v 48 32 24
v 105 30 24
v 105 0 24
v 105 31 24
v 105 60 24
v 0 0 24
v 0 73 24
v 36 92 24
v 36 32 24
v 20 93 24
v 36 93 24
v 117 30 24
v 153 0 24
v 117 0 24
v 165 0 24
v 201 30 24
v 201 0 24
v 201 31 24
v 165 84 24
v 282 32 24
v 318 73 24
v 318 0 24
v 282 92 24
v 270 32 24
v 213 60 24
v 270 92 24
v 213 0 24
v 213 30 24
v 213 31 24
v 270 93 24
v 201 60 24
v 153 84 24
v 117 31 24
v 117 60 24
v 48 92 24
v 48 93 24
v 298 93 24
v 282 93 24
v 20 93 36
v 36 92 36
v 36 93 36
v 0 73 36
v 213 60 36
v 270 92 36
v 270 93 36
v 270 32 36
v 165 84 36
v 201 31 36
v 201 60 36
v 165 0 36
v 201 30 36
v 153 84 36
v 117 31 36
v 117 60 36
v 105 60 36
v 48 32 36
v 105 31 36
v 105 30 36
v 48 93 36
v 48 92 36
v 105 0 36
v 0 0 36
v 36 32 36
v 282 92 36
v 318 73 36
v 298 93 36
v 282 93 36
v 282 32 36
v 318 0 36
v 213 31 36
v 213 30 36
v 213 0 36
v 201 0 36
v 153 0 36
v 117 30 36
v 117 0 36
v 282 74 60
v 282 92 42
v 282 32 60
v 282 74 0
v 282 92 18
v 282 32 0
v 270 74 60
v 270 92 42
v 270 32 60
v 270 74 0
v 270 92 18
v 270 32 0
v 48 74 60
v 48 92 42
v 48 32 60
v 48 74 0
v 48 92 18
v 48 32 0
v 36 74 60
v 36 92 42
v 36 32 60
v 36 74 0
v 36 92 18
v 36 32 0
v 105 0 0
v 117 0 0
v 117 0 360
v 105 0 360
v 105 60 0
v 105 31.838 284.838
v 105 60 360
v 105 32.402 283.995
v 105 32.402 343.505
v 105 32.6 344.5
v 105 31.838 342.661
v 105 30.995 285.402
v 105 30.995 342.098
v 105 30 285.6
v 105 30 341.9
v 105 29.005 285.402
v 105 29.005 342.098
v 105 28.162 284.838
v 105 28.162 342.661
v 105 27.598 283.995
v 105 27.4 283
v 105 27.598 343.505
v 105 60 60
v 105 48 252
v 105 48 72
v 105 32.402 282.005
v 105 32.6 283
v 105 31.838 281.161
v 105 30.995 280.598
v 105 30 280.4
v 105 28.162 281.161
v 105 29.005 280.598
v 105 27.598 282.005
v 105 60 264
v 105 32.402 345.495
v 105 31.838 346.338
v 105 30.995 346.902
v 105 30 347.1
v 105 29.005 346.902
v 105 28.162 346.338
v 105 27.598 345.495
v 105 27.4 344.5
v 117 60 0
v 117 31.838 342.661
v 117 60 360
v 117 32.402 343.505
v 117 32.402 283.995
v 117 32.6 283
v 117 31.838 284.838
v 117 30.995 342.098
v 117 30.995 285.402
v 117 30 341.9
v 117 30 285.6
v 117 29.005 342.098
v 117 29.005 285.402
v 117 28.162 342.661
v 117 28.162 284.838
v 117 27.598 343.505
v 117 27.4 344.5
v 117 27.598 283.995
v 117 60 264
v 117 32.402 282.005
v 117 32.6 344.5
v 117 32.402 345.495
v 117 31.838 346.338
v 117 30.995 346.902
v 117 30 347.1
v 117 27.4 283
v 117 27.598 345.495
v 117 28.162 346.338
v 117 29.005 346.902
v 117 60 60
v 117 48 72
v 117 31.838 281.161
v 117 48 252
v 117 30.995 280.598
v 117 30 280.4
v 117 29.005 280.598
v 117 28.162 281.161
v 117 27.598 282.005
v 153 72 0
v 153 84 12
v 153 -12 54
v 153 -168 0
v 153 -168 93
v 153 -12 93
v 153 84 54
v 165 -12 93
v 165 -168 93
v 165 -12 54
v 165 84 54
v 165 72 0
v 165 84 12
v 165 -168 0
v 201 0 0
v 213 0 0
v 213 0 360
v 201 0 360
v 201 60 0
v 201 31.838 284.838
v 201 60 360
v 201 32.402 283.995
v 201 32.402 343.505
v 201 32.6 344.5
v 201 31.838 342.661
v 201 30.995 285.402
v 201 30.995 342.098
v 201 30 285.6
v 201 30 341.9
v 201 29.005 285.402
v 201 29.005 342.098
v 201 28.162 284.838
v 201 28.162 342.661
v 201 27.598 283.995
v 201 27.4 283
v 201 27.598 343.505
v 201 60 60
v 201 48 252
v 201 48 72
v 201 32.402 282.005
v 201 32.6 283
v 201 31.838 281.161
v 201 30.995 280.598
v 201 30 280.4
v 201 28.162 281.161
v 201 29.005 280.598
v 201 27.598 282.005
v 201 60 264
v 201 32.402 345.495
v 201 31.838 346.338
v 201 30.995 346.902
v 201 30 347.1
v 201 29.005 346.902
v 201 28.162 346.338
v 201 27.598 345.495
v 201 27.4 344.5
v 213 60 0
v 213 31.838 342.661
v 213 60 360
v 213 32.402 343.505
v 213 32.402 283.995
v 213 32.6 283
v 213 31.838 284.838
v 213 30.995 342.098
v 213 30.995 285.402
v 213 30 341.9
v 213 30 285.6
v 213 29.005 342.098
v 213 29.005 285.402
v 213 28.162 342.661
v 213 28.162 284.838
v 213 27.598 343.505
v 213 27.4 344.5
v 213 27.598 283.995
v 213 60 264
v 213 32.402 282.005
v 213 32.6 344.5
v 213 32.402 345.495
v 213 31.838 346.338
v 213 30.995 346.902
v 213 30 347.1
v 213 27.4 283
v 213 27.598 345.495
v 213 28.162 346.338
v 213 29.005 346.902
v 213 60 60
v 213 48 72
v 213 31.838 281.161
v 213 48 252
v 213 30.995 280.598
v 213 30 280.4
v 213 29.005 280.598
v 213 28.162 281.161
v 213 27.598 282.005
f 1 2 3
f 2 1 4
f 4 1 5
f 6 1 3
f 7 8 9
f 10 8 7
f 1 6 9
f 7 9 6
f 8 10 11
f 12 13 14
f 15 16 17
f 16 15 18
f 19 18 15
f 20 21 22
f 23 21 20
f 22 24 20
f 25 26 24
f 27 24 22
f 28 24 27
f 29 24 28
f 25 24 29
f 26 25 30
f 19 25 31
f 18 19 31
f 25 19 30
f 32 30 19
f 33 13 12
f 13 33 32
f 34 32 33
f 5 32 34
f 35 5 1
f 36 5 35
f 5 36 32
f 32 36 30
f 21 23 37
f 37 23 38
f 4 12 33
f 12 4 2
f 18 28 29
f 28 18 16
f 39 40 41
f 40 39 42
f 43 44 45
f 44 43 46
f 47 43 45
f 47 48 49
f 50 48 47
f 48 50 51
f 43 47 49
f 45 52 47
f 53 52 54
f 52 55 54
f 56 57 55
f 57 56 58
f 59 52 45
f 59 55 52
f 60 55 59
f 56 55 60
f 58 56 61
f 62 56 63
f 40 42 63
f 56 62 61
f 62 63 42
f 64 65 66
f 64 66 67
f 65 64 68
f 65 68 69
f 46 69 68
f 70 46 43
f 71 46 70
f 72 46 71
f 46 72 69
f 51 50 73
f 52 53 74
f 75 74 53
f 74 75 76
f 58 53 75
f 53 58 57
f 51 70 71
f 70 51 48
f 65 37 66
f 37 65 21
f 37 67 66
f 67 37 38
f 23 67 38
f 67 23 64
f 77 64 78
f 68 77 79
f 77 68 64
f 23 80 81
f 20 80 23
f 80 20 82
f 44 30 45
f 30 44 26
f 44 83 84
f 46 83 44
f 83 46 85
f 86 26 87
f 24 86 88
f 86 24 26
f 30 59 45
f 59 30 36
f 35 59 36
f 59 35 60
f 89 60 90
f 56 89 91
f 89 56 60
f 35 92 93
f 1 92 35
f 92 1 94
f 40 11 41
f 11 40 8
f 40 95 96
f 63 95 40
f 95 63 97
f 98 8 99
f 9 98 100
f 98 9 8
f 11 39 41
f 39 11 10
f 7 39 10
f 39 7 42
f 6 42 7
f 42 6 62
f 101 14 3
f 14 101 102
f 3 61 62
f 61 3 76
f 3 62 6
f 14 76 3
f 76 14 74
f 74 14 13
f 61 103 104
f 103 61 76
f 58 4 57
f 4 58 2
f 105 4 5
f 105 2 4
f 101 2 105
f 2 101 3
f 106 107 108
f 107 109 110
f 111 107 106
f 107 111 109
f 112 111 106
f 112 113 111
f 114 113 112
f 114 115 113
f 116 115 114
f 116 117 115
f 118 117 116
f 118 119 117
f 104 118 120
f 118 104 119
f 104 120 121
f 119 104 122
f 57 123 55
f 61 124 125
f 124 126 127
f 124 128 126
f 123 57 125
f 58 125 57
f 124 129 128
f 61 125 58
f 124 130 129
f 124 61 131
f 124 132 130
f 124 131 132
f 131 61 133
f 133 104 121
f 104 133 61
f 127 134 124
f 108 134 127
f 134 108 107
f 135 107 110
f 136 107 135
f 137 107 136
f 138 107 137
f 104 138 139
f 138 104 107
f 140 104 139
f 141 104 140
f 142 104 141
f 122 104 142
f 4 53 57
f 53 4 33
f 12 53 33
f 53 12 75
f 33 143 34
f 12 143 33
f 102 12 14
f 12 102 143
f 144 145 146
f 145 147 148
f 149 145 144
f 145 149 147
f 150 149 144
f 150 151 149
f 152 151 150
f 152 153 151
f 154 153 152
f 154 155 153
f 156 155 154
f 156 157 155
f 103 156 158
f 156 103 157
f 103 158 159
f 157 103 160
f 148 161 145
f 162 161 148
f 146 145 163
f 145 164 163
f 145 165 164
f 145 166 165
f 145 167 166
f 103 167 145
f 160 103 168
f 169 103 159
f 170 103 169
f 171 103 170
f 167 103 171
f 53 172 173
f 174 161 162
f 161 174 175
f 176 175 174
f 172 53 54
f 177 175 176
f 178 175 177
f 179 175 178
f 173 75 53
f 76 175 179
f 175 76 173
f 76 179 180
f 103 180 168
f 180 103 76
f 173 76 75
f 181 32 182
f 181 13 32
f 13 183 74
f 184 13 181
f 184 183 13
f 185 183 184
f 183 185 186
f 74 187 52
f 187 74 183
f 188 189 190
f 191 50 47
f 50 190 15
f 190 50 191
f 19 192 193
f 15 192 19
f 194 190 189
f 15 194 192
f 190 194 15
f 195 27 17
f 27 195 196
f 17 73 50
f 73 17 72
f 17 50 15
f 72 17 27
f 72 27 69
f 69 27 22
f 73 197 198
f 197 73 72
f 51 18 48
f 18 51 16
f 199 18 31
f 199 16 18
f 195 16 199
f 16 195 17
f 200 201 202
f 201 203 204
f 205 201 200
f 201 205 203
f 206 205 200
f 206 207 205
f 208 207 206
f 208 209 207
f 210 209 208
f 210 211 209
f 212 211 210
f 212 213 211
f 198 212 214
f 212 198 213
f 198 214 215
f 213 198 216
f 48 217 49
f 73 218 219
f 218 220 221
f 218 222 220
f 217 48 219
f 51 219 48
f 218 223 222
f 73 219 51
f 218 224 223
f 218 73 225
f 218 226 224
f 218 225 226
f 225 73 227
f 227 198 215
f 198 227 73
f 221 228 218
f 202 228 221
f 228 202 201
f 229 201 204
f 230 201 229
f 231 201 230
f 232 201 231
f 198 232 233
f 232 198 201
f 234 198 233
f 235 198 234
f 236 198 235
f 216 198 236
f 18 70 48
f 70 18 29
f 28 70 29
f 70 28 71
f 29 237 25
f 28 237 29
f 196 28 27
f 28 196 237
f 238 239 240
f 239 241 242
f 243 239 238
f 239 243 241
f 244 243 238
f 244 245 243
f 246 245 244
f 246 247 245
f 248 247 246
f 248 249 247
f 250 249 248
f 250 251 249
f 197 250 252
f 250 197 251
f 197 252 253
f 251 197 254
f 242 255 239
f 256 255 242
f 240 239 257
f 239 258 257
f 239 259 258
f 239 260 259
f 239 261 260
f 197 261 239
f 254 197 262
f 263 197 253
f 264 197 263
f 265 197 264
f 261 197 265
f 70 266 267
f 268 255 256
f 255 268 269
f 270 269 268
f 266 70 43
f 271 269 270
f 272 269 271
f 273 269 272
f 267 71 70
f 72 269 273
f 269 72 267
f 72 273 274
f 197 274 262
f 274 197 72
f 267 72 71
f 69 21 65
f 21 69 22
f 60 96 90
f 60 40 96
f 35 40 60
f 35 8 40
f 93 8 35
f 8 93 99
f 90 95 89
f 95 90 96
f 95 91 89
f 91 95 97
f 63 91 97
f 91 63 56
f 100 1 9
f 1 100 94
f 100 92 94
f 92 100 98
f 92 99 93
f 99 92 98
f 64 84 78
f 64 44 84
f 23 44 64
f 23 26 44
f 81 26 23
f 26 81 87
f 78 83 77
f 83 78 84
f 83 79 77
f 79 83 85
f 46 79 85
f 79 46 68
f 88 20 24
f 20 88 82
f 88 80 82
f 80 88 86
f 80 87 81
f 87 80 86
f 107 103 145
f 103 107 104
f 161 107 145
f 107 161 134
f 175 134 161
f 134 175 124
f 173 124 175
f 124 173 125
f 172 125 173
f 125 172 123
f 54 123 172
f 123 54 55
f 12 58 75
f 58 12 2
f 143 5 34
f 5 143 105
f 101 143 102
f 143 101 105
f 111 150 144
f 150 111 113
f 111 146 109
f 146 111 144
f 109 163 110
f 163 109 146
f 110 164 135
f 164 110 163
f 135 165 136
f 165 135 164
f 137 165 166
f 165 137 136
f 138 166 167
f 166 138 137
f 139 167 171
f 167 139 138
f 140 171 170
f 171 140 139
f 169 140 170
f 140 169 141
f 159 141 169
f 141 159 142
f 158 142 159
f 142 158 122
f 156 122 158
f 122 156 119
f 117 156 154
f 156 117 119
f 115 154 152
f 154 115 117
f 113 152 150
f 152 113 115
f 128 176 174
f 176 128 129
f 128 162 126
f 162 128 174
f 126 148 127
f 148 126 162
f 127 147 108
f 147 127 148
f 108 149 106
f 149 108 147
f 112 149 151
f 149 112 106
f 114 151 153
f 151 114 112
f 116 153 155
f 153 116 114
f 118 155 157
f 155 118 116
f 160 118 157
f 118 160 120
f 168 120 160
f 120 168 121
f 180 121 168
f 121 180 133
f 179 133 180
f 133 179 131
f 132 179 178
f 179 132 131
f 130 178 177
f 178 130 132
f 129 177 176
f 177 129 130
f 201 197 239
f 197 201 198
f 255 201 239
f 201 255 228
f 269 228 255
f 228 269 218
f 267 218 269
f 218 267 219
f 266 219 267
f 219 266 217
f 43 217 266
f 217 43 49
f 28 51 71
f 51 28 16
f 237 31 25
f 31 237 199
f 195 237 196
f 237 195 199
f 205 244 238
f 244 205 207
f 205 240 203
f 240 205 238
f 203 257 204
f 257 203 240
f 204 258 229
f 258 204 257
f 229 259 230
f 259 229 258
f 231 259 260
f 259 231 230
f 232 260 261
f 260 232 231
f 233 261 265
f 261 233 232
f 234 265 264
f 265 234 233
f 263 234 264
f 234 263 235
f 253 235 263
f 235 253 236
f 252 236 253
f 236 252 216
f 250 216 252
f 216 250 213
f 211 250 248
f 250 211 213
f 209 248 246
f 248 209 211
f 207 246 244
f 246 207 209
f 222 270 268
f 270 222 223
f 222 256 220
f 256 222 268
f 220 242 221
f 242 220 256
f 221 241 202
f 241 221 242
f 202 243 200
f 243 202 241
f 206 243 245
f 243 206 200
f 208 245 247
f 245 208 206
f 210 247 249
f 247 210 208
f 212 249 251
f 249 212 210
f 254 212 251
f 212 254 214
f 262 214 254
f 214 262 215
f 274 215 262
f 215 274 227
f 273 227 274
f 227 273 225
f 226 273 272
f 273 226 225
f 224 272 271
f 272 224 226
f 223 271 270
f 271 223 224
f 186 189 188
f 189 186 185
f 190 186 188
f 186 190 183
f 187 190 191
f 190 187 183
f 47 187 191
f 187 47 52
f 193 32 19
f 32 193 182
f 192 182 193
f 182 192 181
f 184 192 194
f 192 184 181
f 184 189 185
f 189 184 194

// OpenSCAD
// ==========================================================================
//  GENERATED FILE -- DO NOT EDIT.
//  Produced by build/build.py from components/Turtle_Bottom_Ballast_Fin.scad
//  Turtle Body version 7.2.1
//  Edit lib/ and src/ instead, then run: python3 build/build.py
// ==========================================================================
/*
 Hope Turtle — standalone ballast attachment. Units: mm.
 License: CERN-OHL-S-2.0.
 Two green core slats, one orange bottom board, two red lock feet, one
 yellow ballast fin. No bottle. Individual pieces lie flat on Z=0;
 the assembly raises its lowest component to Z=0.

 SOURCE FILE — geometry lives in lib/ballast_fin.scad + lib/params.scad.
 The committed self-contained file is generated by build/build.py.
*/

part = "assembly"; // [assembly,core_slat,bottom_board,lock_foot,fin]
enable_color_coding = true;
ballast_fin_inspection_pullout = 0; // mm; 0 seats the fin

// [bundle] begin use <../../lib/ballast_fin.scad>
// ==========================================================================
//  Turtle Body -- bottom ballast attachment  (lib module)
// --------------------------------------------------------------------------
//  Two green core slats, one orange bottom board, two red lock feet, one
//  yellow ballast fin. No bottle. See CLAUDE.md s12.
//
//  Use clear inner-face spacing (= bottle_diameter), not centre spacing, for
//  bottle clearance. The yellow fin's bottle-seat cut is enlarged by one
//  stock thickness so the bottle clears it -- preserved here. Ballast joints
//  keep nominal stock slot widths (the rear fin's 0.2 mm allowance is NOT
//  added here).
//
//  Definitions only. Geometry is emitted by local_ballast_assembly() or the
//  individual part modules.
// ==========================================================================

// [bundle] begin use <params.scad>
// ==========================================================================
//  Turtle Body -- shared dimension contract
// --------------------------------------------------------------------------
//  The single source of truth for every dimension that more than one
//  subsystem depends on. Values are exposed as zero-argument functions so
//  this file can be pulled in with `use <params.scad>` (which ignores
//  top-level variable assignments) without polluting any namespace.
//
//  lib/ modules take these as DEFAULT argument values:
//      module control_cap(roof_t = p_cap_roof_t(), ...) { ... }
//  so a src/ wrapper can still override one value from its customizer block
//  while every other subsystem keeps the shared number.
//
//  Rules:
//   * one function per concept, canonical name (see CLAUDE.md cross-file table)
//   * derived values are functions of other p_*() functions, never re-typed
//   * mm throughout; names say _d (diameter), _r (radius), _t (thickness),
//     _len / _h (axial), _af (hex across-flats)
//   * do NOT add a bare `x = ...;` here -- bundle.py / lint.py will reject it
// ==========================================================================

// ---- tolerances and render quality --------------------------------------
function p_eps()          = 0.02;   // Boolean overlap / cut-through fudge
function p_fit_clearance() = 0.2;   // wood joint: TOTAL extra slot width, centred on the board
function p_fn_plastic()   = 120;    // printed PLA parts (cap, cage, axle, mold)
function p_fn_wood()      = 96;     // cut wooden parts
function p_fn_curve()     = 180;    // fine profile curves (bottle, sails)

// ---- bottle (the foundation reference) ---------------------------------
function p_bottle_d()        = 84;    // outside diameter (was 86, and 82 before that; other bottle dims held)
function p_bottle_h()        = 305;   // total height incl. ordinary screw cap
function p_bottle_wall_t()   = 0.5;   // modelling assumption, not a measurement
function p_bottle_cap_d()    = 31;    // ordinary screw cap (NOT the control-cap disk)
function p_bottle_cap_h()    = 17;    // ordinary screw cap height (rear-fin / ballast formulas)
function p_collar_d()        = 34;    // bottle collar, independent of cap diameter
function p_top_dome_h()      = 62;
function p_bottom_dome_h()   = 25;
function p_dome_power()      = 2.5;   // superellipse exponent
function p_bottle_neck_h()   = 5;
function p_bottle_collar_h() = 1;
function p_bottle_neck_d()   = p_bottle_cap_d() - 3;   // 28: neck is 3 mm under the cap
function p_bottle_base_ratio() = 0.88; // slightly narrower footprint at the base
function p_bottle_profile_steps() = 16;
// cut bottle (control head): the lower dome is removed and a short socket is
// bored so the control-cap insert slides in. Cut plane sits 5 mm above the
// bottom dome height.
function p_bottle_cut_extra()  = 5;
function p_bottle_cut_height() = p_bottom_dome_h() + p_bottle_cut_extra();   // 30

// nominal bottle interior (still used by the cut-bottle mock-up)
function p_bottle_socket_d() = p_bottle_d() - 2 * p_bottle_wall_t();          // 83 at Ø84

// ---- control container (v7.1.0; CLAUDE.md s7b) ------------------------
// The control unit is a length of transparent PVC pipe (bought-in, nominal,
// not calipered), not a cut bottle. The control cap closes its top end, the
// control plug its bottom end. Independent of the bottle size.
function p_ctrl_pipe_od()  = 85;
function p_ctrl_pipe_id()  = 81;
function p_ctrl_pipe_len() = 254;   // 10 in cut length; the cap and plug disks add to it

// the cap / plug insert that enters the pipe (was the cut bottle's socket
// until v7.1.0 -- 81 at the Ø84 bottle, 79 at Ø82)
function p_insert_shaft_radial_clearance() = 1;
function p_insert_shaft_d()  = p_ctrl_pipe_id()
                             - 2 * p_insert_shaft_radial_clearance();          // 79

// ---- wooden stock -----------------------------------------------------
function p_wood_t()          = 12;    // shared board / slat thickness
function p_fin_board_w()     = 93;    // shared fin-system stock width
function p_screw_side_offset() = 17;  // mounting-hole inset from a John end (was 25 until v4.2.0)

// ---- Ecojoiner port --------------------------------------------------
// A port must swallow the bottle's tapered top (the top dome) plus a seating
// allowance, so its axial length is DERIVED from the bottle, not fixed. This
// is the same rule the HopeTurtles.org generators use
// (port_length = taper_height + port_allowance); until 2026-09-08 lib carried
// the evaluated constant 82 instead, which silently broke the rule for any
// bottle other than the reference one. Ballast and Ecojoiner both read it.
function p_port_allowance()  = 20;                 // seating allowance beyond the dome
function p_port_length()     = p_top_dome_h() + p_port_allowance();   // 62 + 20 = 82
function p_port_height()     = p_bottle_d();       // opening height == bottle diameter (asserted)

// ---- M6 hardware ---------------------------------------------------
function p_m6_clearance_d()  = 6.4;   // M6 clearance hole
function p_m6_bolt_shaft_d() = 6;     // visual placeholder only
function p_m6_bolt_head_d()  = 12;
function p_m6_bolt_head_t()  = 4;

// ---- Ecojoiner bottle clamp: M5 cap screws + acorn nuts (v5.0.0/v5.1.0) --
// Replaces the M6 bolt + 12 mm presser disk. Each John port end carries TWO
// black M5 x 30 socket-head cap screws, stacked across the John height (one
// above, one below the centreline). v5.1.0: no nut -- each screw BITES into
// a 5.2 mm hole in the wood (builder's research; not verified here), so the
// screw itself holds its position and is adjusted with a hex key from
// outside. A black acorn (cap) nut, run fully onto the tip, bears on the
// bottle. Hardware sizes are ISO 4762 / DIN 1587 nominals for visual and
// stack checks only -- measure the hardware you buy.
// Bite-fit hole (was 5.5 clearance in v5.0.0). NOTE it is slightly LARGER
// than the 5 mm nominal major diameter: the hold relies on wood fibre
// springback around the thread, per the builder's own tests -- unverified
// here, and likely to vary with species, moisture and drill quality.
function p_m5_hole_d()           = 5.2;
function p_m5_bolt_d()           = 5;     // visual shank (plain cylinder)
function p_m5_bolt_len()         = 25;    // clamp screw shank under the head (v7.0.0: was 30 -- one
                                          // centred screw reaches 12 mm, not the pair's 16.05)
function p_m5_head_d()           = 8.5;   // ISO 4762 socket head
function p_m5_head_h()           = 5;
function p_m5_acorn_af()         = 8;
function p_m5_acorn_h()          = 10;    // overall, hex base to dome tip
function p_m5_acorn_thread_depth() = 7;   // usable thread before the bolt bottoms
// v7.0.0: ONE clamp screw per John port end, centred across the John height
// (was a pair at +-18 mm). The collar lock below now stops pull-out, so the
// clamp only has to snug the bottle. Every board bolted through a John
// (rear-fin shafts, ballast core slats, head-fin slats) follows: one centred
// clamp hole + one centred lock hole.
//
// LEGACY pair layout -- used ONLY by the experimental lib/pressor.scad until
// the pressor is moved to the single centred screw (deferred, user decision
// 2026-11-22). Nothing else may use it.
function p_eco_screw_edge_inset()  = 12;   // was 10 until v5.2.0
function p_eco_screw_pair_offset() =
    (p_port_height() - 2 * p_wood_t()) / 2 - p_eco_screw_edge_inset();   // 18

// ---- Ecojoiner collar lock (v7.0.0) ----------------------------------------
//  A second M5, centred across each Little/Master John, bites through the
//  John at the bottle's NECK (between the top dome and the Ø34 support ring).
//  Its bare shank stands in front of the ring on both sides of the bottle, so
//  the ring cannot pass back out: a positive stop, not friction. No acorn --
//  an 8 mm acorn cannot enter the 5 mm neck gap, and the bare shank is the pin.
//  Datum: the support ring rests on the outer face of the CROSSING Little John
//  (the next rectangle's board whose Ø34 hole the neck enters). That face is
//  exactly p_port_length() in from this John's outer end (L/2 - rect_y/2 - t/2
//  = PL; asserted in lib/ecojoiner.scad), so the ring's underside is
//  p_port_length() - p_bottle_collar_h() in and the lock axis is centred on
//  the neck below it. NOTE src/Full_Turtle.scad still seats its bottle mock-ups
//  one p_port_height() deep -- equal to p_port_length() only at an 82 mm
//  bottle (2 mm deeper at the 84 default). NOMINAL: p_bottle_neck_h() (5) equals
//  the M5 diameter, so there is no axial margin -- measure a real bottle's gap
//  between ring underside and where the shoulder exceeds the ring diameter.
function p_eco_lock_x() = p_port_length() - p_bottle_collar_h()
                        - p_bottle_neck_h() / 2;                          // 78.5 from the John's outer end
function p_eco_lock_from_clamp() = p_eco_lock_x() - p_screw_side_offset(); // 61.5 inboard of the clamp screw
function p_eco_lock_bolt_len()   = 55;   // M5 x 55: John 12 + reach to the neck, head ~4.5 mm off the face
function p_eco_lock_tip_gap()    = 0.5;  // tip stops this short of the neck -- a pin, not a clamp on the PET

// ---- pressor (EXPERIMENTAL, v6.6.1; lib/pressor.scad, CLAUDE.md s13a) ----
//  A board block in the port gap between a Little John and the bottle,
//  concave-cut to the bottle radius. The John's M5 pair passes into two
//  plain clearance holes in its back edge and pushes it onto the bottle as
//  the screws are turned in -- replaces the acorn nut. Two per port, one
//  each side of the bottle.
function p_pressor_t()          = 15;    // v6.7.4: pressor board thickness (along the bottle axis);
                                          // its own stock, the Johns stay on p_wood_t() 12
function p_pressor_wrap()       = p_bottle_d() / 4;  // 21: inner edge reaches this far past the
                                                      // bottle's tangent line, toward its axis
function p_pressor_travel()     = 1;     // screw-in travel: gap left at the John face when pressed
function p_pressor_hole_d()     = 6;     // v6.7.4: plain Ø6 clearance hole for the John's M5 screw
                                          // (was a 5.3 x 25.3 pill slot; the Johns keep p_m5_hole_d() 5.2)
function p_pressor_hole_depth() = 8;     // hole depth into the pressor's back edge (v6.6.4: was 10)
function p_pressor_min_wall()   = 3;     // least wood around / beyond a screw hole (asserted)
function p_pressor_end_trim()   = 1.5;   // v6.6.4: taken off EACH end (top/bottom edge) -- the printed
                                          // prototype was 3 mm too long to enter the port

// ---- control cap (large stationary disk; see CLAUDE.md s7) ----------
//  TB-03 resolution: repository 5 mm roof / 2 mm boss is authoritative;
//  the axle (below) is derived to this datum.
function p_cap_disk_d()      = 102;   // control-cap disk (independent of p_bottle_cap_d; was 100, +2 mm)
function p_cap_roof_t()      = 5;     // disk / roof thickness
function p_cap_boss_depth()  = 0;     // extra projection of the centre boss into the hollow cap.
                                       // 0 = no boss, flat cavity ceiling (v6.5.1; was 1.5, before that 2)
function p_cap_boss_d()      = 18;
function p_cap_insert_len()  = 35;    // straight insert shaft length
function p_cap_insert_wall_t() = 4;
function p_cap_entry_chamfer_h()     = 1;
function p_cap_entry_chamfer_delta() = 1;
function p_cap_axle_bore_d() = 6;     // loose: 0.5 mm radial clearance to the Ø5 steel shaft (was 8.7 for Ø8 PLA)
function p_cap_cage_radial_clearance() = 1;   // cap disk -> cage inner wall (radial)
function p_cap_total_h()     = p_cap_roof_t() + p_cap_insert_len();           // 40
function p_cap_bearing_len() = p_cap_roof_t() + p_cap_boss_depth();           // 5 (was 6.5, 7)

// master control cap -- the side tabs ("legs"), buttons, USB-C hole and
// band groove of the production cap (src/components/Bottle_Control_Cap.scad),
// lifted here in v7.1.0 so the cap, the control container's circuit boards
// and the full turtle read one definition. See control_cap_master().
function p_cap_tab_width()        = 22;   // tangential; the circuit boards sandwich it
function p_cap_tab_wall_inset()   = 6;
function p_cap_tab_overhang()     = 28;   // past the insert lip
function p_cap_tab_fillet()       = 4;
function p_cap_tab_taper_gain()   = 6;
function p_cap_tab_taper_start()  = 10;
function p_cap_tab_side_offset()  = 6;    // both legs slid sideways (boards need ~0 -- see s7b)
function p_cap_tab_wire_hole_d()  = 5;
function p_cap_tab_wire_exit()    = 15;
function p_cap_button_d()         = 16.5;
function p_cap_button_center_r()  = 23.2; // true cap centre -> button centre
function p_cap_button_offset()    = 6;    // both buttons slid off the axis line
function p_cap_usbc_d()           = 11;
function p_cap_band_count()       = 1;
function p_cap_band_z()           = 5;    // groove centre from the insert shoulder
function p_cap_band_w()           = 10;
function p_cap_band_depth()       = 2;

// buttons (through both cap and cage)
function p_button_upper_d()  = 17;    // clearance hole in the cap
function p_button_axis()     = "y";   // "x" or "y"
function p_button_radius()   = 25;    // radial position of the two button centres (50 mm apart;
                                       // was 24 / 48 mm -- shared with the cage's matching bore)

// ---- silicone seal grooves + rings (CLAUDE.md s8) ------------------
function p_seal_groove_count()      = 2;
function p_seal_groove_axial_h()    = 2.7; // groove height (was 3.5; retuned to just clear
                                            // the 2.6 mm ring axial thickness below, 0.1 mm margin)
function p_seal_groove_radial_depth() = 2; // groove depth
function p_seal_groove1_from_shoulder() = 12;  // groove centre, measured from the insert SHOULDER
function p_seal_groove2_from_shoulder() = 25;
function p_seal_ring_axial_t()      = 2.6;  // cast ring thickness (was 3)
function p_seal_ring_radial_w()     = 10;   // cast ring radial width (was 5; doubled). NOT validated.
function p_seal_ring_elasticity_reduction() = 0.25;
    // Cast the ring's inner diameter this fraction SMALLER than the groove
    // root it mates to, so real (stretchy) silicone is under tension --
    // and therefore actually grips -- once stretched onto the cap, instead
    // of sitting at a 1:1 as-cast fit. Tweak this here as real silicone
    // behaviour is characterized; NOT validated (see lib/silicone_ring_mold.scad).
function p_seal_groove_root_d() = p_insert_shaft_d()
                                - 2 * p_seal_groove_radial_depth();            // 79 at the 86 mm bottle

// ---- sail shaft: uniform round centre axle (CLAUDE.md s9) ----------
//  Derived to the 5/2 cap datum (TB-03/TB-04). round_inside_cap is measured
//  from the roof underside and INCLUDES the boss -- do not add the boss again.
//  TB-08: the shaft is now one uniform round bar top to bottom -- no hex
//  section. It free-spins in the cap bore (p_cap_axle_bore_d) and passes
//  with a light running clearance through the cage hub bore and the top
//  sail bar's own hole (both p_axle_shaft_hole_d()); it locks to the
//  ROTATING cage with a single M3 set screw through the cage hub
//  (p_cage_setscrew_pilot_d()) rather than a shaped (hex) interference fit.
function p_axle_round_d()        = 5;    // Ø5 steel rod (v6.4.0; was an Ø8 printed PLA shaft)
function p_axle_round_ext()      = 1;    // projection above the cap's outer face
function p_axle_round_inside_cap() = p_cap_insert_len() - 5;  // 30: roof underside to round end (incl. boss)
function p_axle_round_len()      = p_axle_round_inside_cap() + p_cap_roof_t() + p_axle_round_ext();  // 36
function p_axle_upper_len()      = 23;   // continues up through the cage hub + sail bar (was the hex length)
function p_axle_total_len()      = p_axle_upper_len() + p_axle_round_len();
function p_axle_shaft_clearance() = 0.4; // snug fit, diametral (was 0.2 on the Ø8 shaft): any hole the shaft passes
                                          // (but does not bear in) is p_axle_round_d() + this
function p_axle_shaft_hole_d()   = p_axle_round_d() + p_axle_shaft_clearance();  // 5.4 (cage hub bore)
function p_magnet_d()            = 3;    // AS5600 sensing magnet recess
function p_magnet_t()            = 1;

// ---- axle rotary shaft O-ring (waterproofs the axle bore; cast in the mold) ----
//  A round-section O-ring seated in a gland in the control-cap bore, sealing
//  against the spinning round section of the axle. ID is tied to the shaft.
function p_axle_oring_cs()     = 2.0;                                   // cross-section
function p_axle_oring_id()     = p_axle_round_d();                      // 5 -- hugs the shaft
function p_axle_oring_od()     = p_axle_oring_id() + 2 * p_axle_oring_cs();          // 9
function p_axle_oring_mean_r() = (p_axle_oring_id() + p_axle_oring_cs()) / 2;        // 3.5
//  gland cut into the cap bore for it
function p_cap_oring_squeeze()      = 0.25;  // radial squeeze on the seal
function p_cap_oring_gland_od()     = p_axle_oring_od() - 2 * p_cap_oring_squeeze(); // 8.5
function p_cap_oring_gland_w()      = 1.3 * p_axle_oring_cs();                       // 2.6 axial
function p_cap_oring_gland_from_face() = p_cap_bearing_len() / 2; // gland centre, from the cap outer face, along the bore
                                         // (2.5 = mid-roof since the boss went in v6.5.1; was 3.5)

// ---- rotating control cage (CLAUDE.md s6) ------------------------
function p_cage_wall_t()     = 6.5;   // radial wall thickness
function p_cage_roof_t()     = 4;     // roof / surface plate thickness
function p_cage_inner_d()    = p_cap_disk_d() + 2 * p_cap_cage_radial_clearance();   // 102
function p_cage_outer_d()    = p_cage_inner_d() + 2 * p_cage_wall_t();               // 115
function p_cage_skirt_depth()   = 44;   // roof underside to the ORIGINAL skirt rim
function p_cage_peak_extension() = 20;  // crest extends this far past the original rim
function p_cage_valley_wall_h()  = 10;  // minimum wall depth between mounts
function p_cage_total_h()    = p_cage_skirt_depth() + p_cage_roof_t();              // 48 (native)
function p_cage_notch_count()   = 4;
function p_cage_notch_w()    = 22.5;  // batten groove width
function p_cage_notch_depth() = 3.7;
function p_cage_wave_segments() = 240;
function p_cage_hub_d()      = 29;
function p_cage_pocket_d()   = 26;    // top clip pocket (control_cage top_pocket, OFF by default)
function p_cage_pocket_depth() = 4;   //   "        "     "
// TB-08: hex bore replaced by a plain round bore (p_axle_shaft_hole_d(),
// shared with the sail bar) + a radial M3 set screw that locks the cage to
// the shaft -- see p_cage_setscrew_*() below.
function p_cage_bearing_d()  = 9;     // hemispherical bearing bump
function p_cage_bearing_count() = 8;
function p_cage_bearing_pcd() = p_cap_disk_d() - p_cage_bearing_d() + 0.5;          // 91.5
function p_cage_top_hole_d() = 18;    // button / access hole through the roof (v6.5.2: back to 18 from 22;
                                       // the 22 opened onto the hub for set-screw access, off since v6.0.0)
function p_cage_mount_hole_d() = 3.2; // two M3 clearance holes per batten / groove
function p_cage_mount_pitch()  = 32;  // vertical pitch of the pair
function p_cage_lower_hole_from_tip() = 10;
// Single radial M3 set (grub) screw through the hub wall, pressing on the
// shaft to lock cage <-> shaft rotation (TB-08). Self-tapping into the
// printed PLA hub -- not a clearance hole for a separate nut, unlike the
// batten/mount M3 holes above. Pilot diameter is an untested starting
// point (typical M3-into-rigid-plastic self-tap pilots run 2.5-2.8 mm) --
// verify real thread engagement and tapping torque before relying on it.
function p_cage_setscrew_pilot_d() = 2.5;
// v6.0.0: the hub set screw (and its access recess) is switched OFF -- the
// M3 in the sail crossbar connector now clamps the shaft. Kept, not deleted,
// so it can be turned back on.
function p_cage_setscrew_enabled() = false;
// Flat-floored access recess around the set screw, cut into the hub face the
// roof button opening uncovers, running the hub's full height (roof top down
// through the hub bottom). Width is tangential, depth is radial (inward from
// the opening's inner edge).
function p_cage_setscrew_recess_w()     = 5;
function p_cage_setscrew_recess_depth() = 3;
// Set-screw angle is no longer a separate parameter: control_cage() aims it
// at the centre of the roof button opening (button_angle) so a hex key can
// reach it through that opening.
// 45-deg outward chamfer on the roof-top outer edge (0 = sharp). The cage
// prints roof-face-down, so this bevel flares OUT from the bed and stays
// printable; it runs the full perimeter, batten grooves included. See
// lib/control_cage.scad.
function p_cage_roof_bevel() = 3;

// ---- sail apparatus (CLAUDE.md s10) ---------------------------
// SAIL battens. v6.0.0: the upper notch holds two stacked layers (connector
// below, crossbar half above), so the batten grew by the extra layer: 205 +
// 2t (229) at first, trimmed back by t to 205 + t (217) in v6.1.0 so 15 mm of
// batten stands above the notch again. Batten bottom, cage M3 holes and the
// lower rails do not move. The NON-sail battens are shorter: their top is
// flush with the cage roof top (derived in lib/sail_frame.scad, 178 mm).
function p_side_batten_h()   = 205 + p_wood_t();       // 217
function p_side_batten_w()   = 20;
// v6.5.0: battens are cut from the same board as every other slat (were a
// separate 20 x 10 stock), so their radial thickness -- and every slot that
// takes a batten -- is the board thickness.
function p_side_batten_radial_t() = p_wood_t();     // 12 (was 10)
// Top crossbar span, tip to tip: 6 x bottle_d (504). v6.1.0 briefly made each
// half a head-fin-slat length (span 843.6); v6.2.0 reverted it -- the sails
// came out too big. The halves are derived from this span.
function p_top_crossbar_len() = 6 * p_bottle_d();   // 504 (halves 212.2 each)
function p_top_crossbar_w()  = 22;
function p_top_crossbar_t()  = p_wood_t();          // 12
// v6.0.0: the top crossbar is split into a LEFT and RIGHT half plus a
// centre "sail crossbar connector". The connector lies on the cage roof and
// spans between the two sail battens; each half lies on top of it and runs
// out to its tip. Both layers half-lap into the same (now 2t tall) sail-batten
// notch, and one M3 per side screws the half down into the connector.
// The shaft passes the connector with generous clearance (no bearing), and an
// M3 self-tapped in from the connector's side face clamps it, locking frame,
// cage and shaft together (replaces the cage hub set screw).
function p_sail_connector_axle_hole_d()  = 6;     // Ø5 steel shaft, 0.5 mm radial clearance (v6.4.0; was 9 for the Ø8 shaft)
function p_sail_m3_pilot_d()             = 2.8;   // self-tap pilot: clamp screw + the half-to-connector screws
function p_sail_m3_clear_d()             = p_cage_mount_hole_d();   // 3.2, through the top (half) layer
function p_sail_connector_overhang()     = 15;    // connector past each sail batten's outer face
function p_sail_bar_half_inboard()       = 15;    // each half runs this far inboard of its batten
function p_bottom_rail_len() = 3 * p_bottle_d() + p_wood_t();   // 264 (v6.3.0: +t; 252 in v6.2.0, 360 in v6.1.0)
function p_bottom_rail_bottle_clearance() = 1;
function p_sail_rail_color()  = [0.56, 0.39, 0.39]; // brown (top AND bottom rails)
function p_c_piece_color()    = [1.0, 0.52, 0.20];  // orange, retained

// ---- rear fin + solar support (CLAUDE.md s11) ----------------
function p_solar_panel_w() = 148;
function p_solar_panel_h() = 223;
function p_solar_panel_t() = 2.5;    // real panel, independent of wood thickness
// The green shafts overlap the yellow fin over X = 0..p_rear_shaft_rear_x()
// (the half-lap zone, 84 mm). v5.3.0: the bottle base must ABUT the fin's
// front edge (X = 0) so the fin holds the bottle in its port -- previously
// the full turtle seated the bottle base at the shafts' rear end, putting the
// first 84 mm of the fin inside the bottle. The shaft front (and its John
// hole pair) stays where it was, so the shafts grow by exactly that overlap:
//   334 (old approved formula) + 84 = 418.
// v5.7.0: the yellow fin is exactly one board wide (it was board + a 15 mm
// "rear tab", 108 mm -- wider than the 93 mm board it is cut from), so the
// overlap is board width - 2t: 84 -> 69, shaft 418 -> 403, half-lap 42 -> 34.5.
function p_rear_shaft_rear_x() = p_fin_board_w() - 2 * p_wood_t();             // 69
function p_rear_shaft_len() = p_bottle_h()
                            + (2/3) * (p_fin_board_w() - 2 * p_wood_t())
                            - p_bottle_cap_h()
                            + p_rear_shaft_rear_x();                            // 403 (418 v5.3.0-v5.6.0)
function p_rear_half_lap_engagement() = p_rear_shaft_rear_x() / 2;  // 34.5 green/yellow interlock depth
// v5.4.0: the green shaft is as wide as the Ecojoiner John it bolts flush
// against (John height = port height - 2 x stock), so their edges and M5 pair
// line up. Was a fixed 59 -- 1 mm narrower than the 60 mm John, and the M5
// pair (centred on it) sat 11.5 mm in from its edges instead of 12.
function p_rear_shaft_width()   = p_port_height() - 2 * p_wood_t();            // 60
// TB-07: the green-slat mounting hole follows the mating Ecojoiner John, not a
// fixed 50 mm. Derived from the install transform; the john_length/2 terms
// cancel, leaving a pure function of the shared contract (= 113 at defaults).
// v5.3.0: the install now seats the bottle base at fin X = 0 (not at the
// shaft rear, X = p_rear_shaft_rear_x()), so that overlap is subtracted back
// out -- the hole stays 113 mm from the (unmoved) shaft front.
function p_rear_shaft_hole_from_front() =
    p_rear_shaft_len() - p_rear_shaft_rear_x() - p_screw_side_offset()
    - p_bottle_h() + p_bottle_cap_h() + p_port_height();

// ---- head fin: front fin (v5.8.0, EXPERIMENTAL; triangle since v6.3.0) ---------
// The rear fin's mirror on the front (-X / physical 9 o'clock) port: two
// flat slats above and below the front bottle bolt to the same Little John
// M5 pairs and run the length of the bottle; a vertical triangular fin
// half-laps into their outer ends and abuts the bottle base. Not built or
// tested. See lib/head_fin.scad.
//  * fin width (forward, along the bottle axis) = the widest board, so the
//    fin is cut across one board (its height runs along the board's length)
//  * the slats reach exactly as far into the Ecojoiner as the rear shafts,
//    so their M5 pair lands at the same distance from the slat front
function p_head_fin_w()       = p_fin_board_w();                         // 93
function p_head_fin_h()       = p_bottle_d() + 6 * p_wood_t();           // 156: 2t of fin beyond each slat
function p_head_slat_overlap() = 4 * p_wood_t();                         // 48: slat run into the fin
// v6.3.1 profile (v6.3.0 had the slope the other way): the TOP edge runs
// out only to this X (where the slats end); the leading edge slopes down and
// FORWARD from there to a vertical flat "toe" at the full fin width, which
// meets the bottom edge. Full width along the BOTTOM edge.
function p_head_fin_heel_x()  = p_head_slat_overlap();                   // 48: top-edge length
function p_head_fin_toe_h()   = 3 * p_wood_t();                          // 36: vertical flat nose at the bottom front (v6.3.4; was 2t)
// v6.3.2: the fin extends DOWN below p_head_fin_h()'s bottom by this much (top
// unchanged), and its new bottom-front corner is set back, giving a raked
// forefoot below the toe flat.
function p_head_fin_drop()    = 3 * p_wood_t();                          // 36
function p_head_fin_forefoot_setback() = p_head_fin_drop();             // 36: = drop -> 45 deg cut (v6.3.3; was 18)
function p_head_half_lap_engagement() = p_head_slat_overlap() / 2;       // 24
function p_head_slat_reach()  = p_rear_shaft_len() - p_rear_shaft_rear_x();   // 334: bottle base -> slat front
function p_head_slat_len()    = p_head_slat_reach() + p_head_slat_overlap();  // 382
function p_head_slat_width()  = p_rear_shaft_width();                    // 60 == John height
function p_head_slat_hole_from_front() = p_rear_shaft_hole_from_front(); // 113: same reach -> same John pair

// ---- ballast attachment (CLAUDE.md s12) ---------------------
function p_ballast_core_w()   = p_port_height() - 2 * p_wood_t();               // 60 == John height
function p_ballast_core_len() = p_bottle_h() - p_bottle_cap_h() + 6 * p_wood_t();  // 360
function p_ballast_slat_gap() = p_port_height();       // clear inner-face gap
function p_ballast_slat_spacing() = p_port_height() + p_wood_t();               // 96
function p_ballast_board_len() = 3.5 * p_bottle_d() + 2 * p_wood_t();   // 318 (v5.5.0: +2t, 3t ends past the foot slots)
function p_ballast_fin_len()   = 3 * p_bottle_d();     // 246
function p_ballast_lock_w()    = 5 * p_wood_t();       // 60

// ---- neutral wood shades (used when enable_color_coding = false) -------
// With the full colour code off, every wooden subsystem still renders in its
// OWN shade of brown so the parts stay visually separable. All are warm browns
// (R > G > B) spaced by lightness. The two large fins share one darker shade so
// they read as a matched pair, distinct from the rest of their own assembly.
function p_wood_shade_sail()     = [0.85, 0.66, 0.47]; // sail frame  (lightest)
function p_wood_shade_rear_fin() = [0.72, 0.50, 0.33]; // rear-fin shafts + solar holder
function p_wood_shade_eco()      = [0.62, 0.44, 0.28]; // Ecojoiner core
function p_wood_shade_ballast()  = [0.52, 0.34, 0.22]; // ballast slats / board / locks
function p_wood_shade_fin()      = [0.40, 0.26, 0.17]; // rear fin + ballast fin, shared (darkest)
// [bundle] end   <params.scad>
// [bundle] begin use <util.scad>
// ==========================================================================
//  Turtle Body -- shared helper modules and functions
// --------------------------------------------------------------------------
//  Small pieces that were copy-pasted across the standalone files. Geometry
//  lives in the per-subsystem lib/ modules; this file is only glue.
//
//  Definitions only -- no top-level geometry, no top-level assignments.
// ==========================================================================

// [bundle] begin use <params.scad>
// [bundle] already inlined: params.scad
// [bundle] end   <params.scad>

// Colour wrapper for wooden parts. When colour coding is off, every wooden
// component renders in one neutral wood tone; bottles, hardware, sails and
// printed parts keep their own colours and never call this.
module wood_color(coded_color, enabled = true, neutral = [0.94, 0.83, 0.62]) {
    color(enabled ? coded_color : neutral) children();
}

// scalar clamp
function clamp(v, lo, hi) = v < lo ? lo : (v > hi ? hi : v);

// Visual-only M6 bolt: plain shaft + hex-less cylindrical head. No thread,
// no torque rating -- a placeholder for fit inspection.
//  Local Z=0 is the underside of the head; the shaft runs toward +Z from Z=0
//  (plus an optional tip_extension), the head sits at Z=-head_t..0. Matches
//  the standalone files.
module m6_bolt_placeholder(grip_length, tip_extension = 1,
                           shaft_d = undef, head_d = undef, head_t = undef,
                           color_rgb = [0.15, 0.15, 0.15], fn = 48) {
    sd = shaft_d == undef ? p_m6_bolt_shaft_d() : shaft_d;
    hd = head_d  == undef ? p_m6_bolt_head_d()  : head_d;
    ht = head_t  == undef ? p_m6_bolt_head_t()  : head_t;
    assert(grip_length > 0, "m6_bolt_placeholder: grip_length must be positive.");
    color(color_rgb)
        union() {
            cylinder(d = sd, h = grip_length + tip_extension, $fn = fn);
            translate([0, 0, -ht])
                cylinder(d = hd, h = ht, $fn = fn);
        }
}

// Regular hexagonal prism specified by across-flats width (OpenSCAD's
// cylinder($fn=6) is specified across corners, which is the usual trap).
module hex_prism_af(across_flats, h, center = false) {
    cylinder(d = across_flats / cos(30), h = h, $fn = 6, center = center);
}
// [bundle] end   <util.scad>

function bl_t()            = p_wood_t();
// The green core slats bolt flush against the Ecojoiner's Little Johns and
// clamp the bottle between them, so they follow the PORT height (== bottle
// diameter here; the HopeTurtles.org generator adds the form's fit offset):
// width == John height, inner-face gap == port height. v5.4.1: written in
// p_port_height() terms (same values) to make that tie explicit.
function bl_core_w()       = p_port_height() - 2 * bl_t();                       // 60 == John height
function bl_core_h()       = p_bottle_h() - p_bottle_cap_h() + 6.0 * bl_t();     // 360
function bl_lower_lobe()   = 2 * bl_t();
function bl_upper_lobe()   = 2 * bl_t();
function bl_core_slot_h()  = bl_t();
function bl_core_slot_depth() = bl_core_w() / 2;
function bl_neck_w()       = p_port_height() - 3 * bl_t();                       // 48
function bl_shoulder_step()   = bl_core_w() - bl_neck_w();                       // 12
// Distance from the slat top down to where the upper 45-degree shoulder cut
// begins. The seated slat top is port_length + t inside the outer John's
// port end, so the cut must start at least that far down or it bites into
// the slat while still inside the John. v5.6.0: was one port_height (84,
// 10 mm inside the John); now one board width lower and never above the
// John end -- max(port_height, port_length) + t (96 at defaults).
function bl_upper_diag_from_top() = max(p_port_height(), p_port_length()) + bl_t();
function bl_upper_diag_start() = bl_core_h() - bl_upper_diag_from_top();
function bl_upper_neck_start() = bl_upper_diag_start() - bl_shoulder_step();
function bl_core_slot_z0() = bl_lower_lobe();
function bl_core_slot_z1() = bl_core_slot_z0() + bl_core_slot_h();
function bl_lower_full_return() = bl_core_slot_z1() + bl_upper_lobe();
function bl_lower_neck_start()  = bl_lower_full_return() + bl_shoulder_step();
function bl_mount_hole_from_top() = p_port_length() + bl_t() - p_screw_side_offset();  // 77
function bl_mount_hole_x()  = bl_core_w() / 2;
function bl_mount_hole_y()  = bl_core_h() - bl_mount_hole_from_top();
// v7.0.0 collar-lock hole: centred, p_eco_lock_from_clamp() nearer the slat
// top (= the core) than the clamp hole -- 15.5 mm from the top at defaults.
function bl_lock_hole_from_top() = bl_mount_hole_from_top() - p_eco_lock_from_clamp();
function bl_lock_hole_y()   = bl_core_h() - bl_lock_hole_from_top();

function bl_board_len()    = p_ballast_board_len();                              // 318
function bl_board_w()      = p_fin_board_w();                                    // 93
function bl_board_slot_w() = bl_t();
function bl_board_slot_depth()  = p_fin_board_w() / 3;
function bl_center_slot_depth() = p_bottle_d() / 2;
function bl_center_slot()  = bl_board_len() / 2;
function bl_slat_spacing() = p_port_height() + bl_t();                          // 96
function bl_left_slot()    = bl_center_slot() - bl_slat_spacing() / 2;
function bl_right_slot()   = bl_center_slot() + bl_slat_spacing() / 2;
// Solid wood outboard of each red-foot slot. v5.5.0: 2 -> 3 board thicknesses
// (the board grew by 2*t to keep every slot where it was relative to centre)
// so the ends past the foot slots are less likely to split off.
function bl_end_slot_offset() = 3 * bl_t();                                      // 36
function bl_left_end_slot_x0()  = bl_end_slot_offset();
function bl_right_end_slot_x0() = bl_board_len() - bl_end_slot_offset() - bl_board_slot_w();
// 45-degree plan-view chamfer on both corners of the FRONT edge (y = board
// width, the red-foot-slot edge; the yellow fin trails aft from y = 0 in the
// full turtle). Legs are this long along each edge. v5.5.0.
function bl_board_front_chamfer() = 20;

function bl_lock_w()       = 5 * bl_t();                                         // 60
function bl_lock_h()       = 5 * bl_t();
function bl_lock_t()       = bl_t();
function bl_lock_slot_depth() = bl_lock_w() / 2;
function bl_lock_slot_h()  = bl_t();
function bl_lock_chamfer() = 1.5 * bl_t();

function bl_fin_len()      = 3 * p_bottle_d();                                   // 246
function bl_fin_h()        = p_fin_board_w();                                    // 93
function bl_fin_t()        = bl_t();
function bl_fin_lower_protrusion() = 2 * bl_t();
function bl_fin_slot_h()   = bl_t();
function bl_fin_slot_depth()   = p_bottle_d() / 2;
function bl_fin_upper_cut_depth() = p_bottle_d() + bl_t();   // +1 stock thickness so the bottle clears
function bl_fin_upper_cut_z0()    = bl_fin_lower_protrusion() + bl_fin_slot_h() + 1.5 * bl_t();
// One full board thickness of solid material between the chamfer and the
// slot above it (bl_fin_lower_protrusion() - bl_fin_front_chamfer() ==
// bl_t()): was 1.5*bl_t(), leaving only 0.5*bl_t() there -- a thin sliver
// right at the corner between two cuts, weaker than it needs to be.
function bl_fin_front_chamfer()   = bl_fin_lower_protrusion() - bl_t();   // = bl_t()

module bl_assert_valid() {
    t = bl_t();
    assert(p_bottle_h() > p_bottle_cap_h() && t > 0 && p_bottle_d() > 3 * t);
    assert(bl_core_h() - p_bottle_d() - t > 6 * t, "ballast: slat shoulders overlap.");
    assert(p_m5_hole_d() > 0 && p_m5_hole_d() < bl_core_w(),
           "ballast: M5 hole wider than the core slat.");
    assert(bl_lock_hole_from_top() > p_m5_hole_d() / 2,
           "ballast: collar-lock hole breaks out of the slat top.");
    assert(bl_mount_hole_from_top() > p_m5_hole_d() / 2
           && bl_mount_hole_from_top() < p_bottle_d() - p_m5_hole_d() / 2,
           "ballast: mount holes miss the upper slat end.");
    assert(p_fin_board_w() > max(4.5 * t, p_bottle_d() / 2), "ballast: fin board too narrow.");
    assert(bl_core_w() == p_port_height() - 2 * t,
           "ballast: slat width must use the shared bottle diameter.");
    assert(bl_core_h() - bl_upper_diag_start() >= p_port_length() + t - 0.001,
           "ballast: top shoulder cut must begin at or below the John's port end.");
    assert(bl_upper_neck_start() > bl_lower_neck_start(),
           "ballast: upper and lower shoulder cuts overlap.");
    assert(abs((bl_slat_spacing() - bl_t()) - p_bottle_d()) < 0.001,
           "ballast: slat inner-face gap must equal the shared bottle diameter.");
    assert(bl_board_front_chamfer() >= 0
           && bl_board_front_chamfer() < bl_end_slot_offset()
           && bl_board_front_chamfer() < bl_board_slot_depth(),
           "ballast: board front chamfer would cut into a red-foot slot.");
    assert(abs(bl_center_slot_depth() - bl_fin_slot_depth()) < 0.001,
           "ballast: orange-base and yellow-fin slots must have equal depth.");
}

// ---- 2D profiles + parts -------------------------------------------
module bl_core_profile_2d()
    polygon([[0, 0], [bl_core_w(), 0],
             [bl_core_w(), bl_core_h()], [0, bl_core_h()],
             [0, bl_upper_diag_start()],
             [bl_shoulder_step(), bl_upper_neck_start()],
             [bl_shoulder_step(), bl_lower_neck_start()],
             [0, bl_lower_full_return()],
             [0, bl_core_slot_z1()],
             [bl_core_slot_depth(), bl_core_slot_z1()],
             [bl_core_slot_depth(), bl_core_slot_z0()],
             [0, bl_core_slot_z0()]]);

module ballast_core_slat_part(colored = true)
    wood_color([0.12, 0.38, 0.20], colored, p_wood_shade_ballast())
        linear_extrude(height = bl_t()) difference() {
            bl_core_profile_2d();
            // v7.0.0: centred M5 clamp hole + collar-lock hole, matching the Little John
            for (y = [bl_mount_hole_y(), bl_lock_hole_y()])
                translate([bl_mount_hole_x(), y])
                    circle(d = p_m5_hole_d(), $fn = 16);
        }

module ballast_bottom_board_part(colored = true) {
    e = 0.01;
    wood_color([0.90, 0.38, 0.06], colored, p_wood_shade_ballast())
    linear_extrude(height = bl_t()) difference() {
        let(L = bl_board_len(), W = bl_board_w(), ch = bl_board_front_chamfer())
            polygon([[0, 0], [L, 0], [L, W - ch], [L - ch, W],
                     [ch, W], [0, W - ch]]);
        translate([bl_left_slot() - bl_board_slot_w() / 2, -e])
            square([bl_board_slot_w(), bl_board_slot_depth() + e]);
        translate([bl_center_slot() - bl_board_slot_w() / 2, -e])
            square([bl_board_slot_w(), bl_center_slot_depth() + e]);
        translate([bl_right_slot() - bl_board_slot_w() / 2, -e])
            square([bl_board_slot_w(), bl_board_slot_depth() + e]);
        translate([bl_left_end_slot_x0(), bl_board_w() - bl_board_slot_depth()])
            square([bl_board_slot_w(), bl_board_slot_depth() + e]);
        translate([bl_right_end_slot_x0(), bl_board_w() - bl_board_slot_depth()])
            square([bl_board_slot_w(), bl_board_slot_depth() + e]);
    }
}

module bl_lock_profile_2d() {
    y0 = (bl_lock_h() - bl_lock_slot_h()) / 2;
    y1 = y0 + bl_lock_slot_h();
    ch = bl_lock_chamfer();
    polygon([[0, 0], [bl_lock_w() - ch, 0], [bl_lock_w(), ch],
             [bl_lock_w(), bl_lock_h() - ch], [bl_lock_w() - ch, bl_lock_h()],
             [0, bl_lock_h()], [0, y1], [bl_lock_slot_depth(), y1],
             [bl_lock_slot_depth(), y0], [0, y0]]);
}

module ballast_lock_part(colored = true)
    wood_color([0.70, 0.12, 0.10], colored, p_wood_shade_ballast())
        linear_extrude(height = bl_lock_t()) bl_lock_profile_2d();

module bl_fin_profile_2d() {
    e = 0.01; ch = bl_fin_front_chamfer();
    difference() {
        polygon([[ch, 0], [bl_fin_len(), 0], [bl_fin_len(), bl_fin_h()],
                 [0, bl_fin_h()], [0, ch]]);
        translate([-e, bl_fin_lower_protrusion()])
            square([bl_fin_slot_depth() + e, bl_fin_slot_h()]);
        translate([-e, bl_fin_upper_cut_z0()])
            square([bl_fin_upper_cut_depth() + e, bl_fin_h() - bl_fin_upper_cut_z0() + e]);
    }
}

// Shares p_wood_shade_fin() with the rear fin so the two large fins read as a
// matched pair, distinct from the rest of the ballast.
module ballast_fin_part(colored = true)
    wood_color([0.95, 0.72, 0.02], colored, p_wood_shade_fin())
        linear_extrude(height = bl_fin_t()) bl_fin_profile_2d();

// ---- local assembly ------------------------------------------------
module bl_installed_green_slat(slot_center_x, colored = true)
    multmatrix([[0, 0, 1, slot_center_x - bl_t() / 2],
                [-1, 0, 0, bl_core_w()],
                [0, 1, 0, -bl_core_slot_z0()],
                [0, 0, 0, 1]])
        ballast_core_slat_part(colored);

module bl_installed_lock(slot_x0, colored = true) {
    lock_center_x = slot_x0 + bl_board_slot_w() / 2;
    lock_origin_y = (bl_board_w() - bl_board_slot_depth()) - bl_lock_slot_depth();
    y0 = (bl_lock_h() - bl_lock_slot_h()) / 2;
    multmatrix([[0, 0, 1, lock_center_x - bl_lock_t() / 2],
                [1, 0, 0, lock_origin_y],
                [0, 1, 0, -y0],
                [0, 0, 0, 1]])
        ballast_lock_part(colored);
}

module bl_installed_fin(inspection_pullout = 0, colored = true) {
    fin_origin_y = bl_center_slot_depth() + bl_fin_slot_depth() + inspection_pullout;
    multmatrix([[0, 0, 1, bl_center_slot() - bl_fin_t() / 2],
                [-1, 0, 0, fin_origin_y],
                [0, 1, 0, -bl_fin_lower_protrusion()],
                [0, 0, 0, 1]])
        ballast_fin_part(colored);
}

module local_ballast_assembly(inspection_pullout = 0, colored = true) {
    bl_assert_valid();
    ballast_bottom_board_part(colored);
    bl_installed_lock(bl_left_end_slot_x0(), colored);
    bl_installed_lock(bl_right_end_slot_x0(), colored);
    bl_installed_green_slat(bl_left_slot(), colored);
    bl_installed_green_slat(bl_right_slot(), colored);
    bl_installed_fin(inspection_pullout, colored);

    echo("BALLAST: slat w/len/t = ", bl_core_w(), bl_core_h(), bl_t(),
         " | inner-face gap = ", bl_slat_spacing() - bl_t(),
         " | M5 pair from slat top = ", bl_mount_hole_from_top());
}
// [bundle] end   <../../lib/ballast_fin.scad>

if (part == "assembly") {
    translate([0, 0, max(bl_lower_lobe(),
                         (bl_lock_h() - bl_lock_slot_h()) / 2,
                         bl_fin_lower_protrusion())])
        local_ballast_assembly(inspection_pullout = ballast_fin_inspection_pullout,
                               colored = enable_color_coding);
} else if (part == "core_slat") {
    ballast_core_slat_part(colored = enable_color_coding);
} else if (part == "bottom_board") {
    ballast_bottom_board_part(colored = enable_color_coding);
} else if (part == "lock_foot") {
    ballast_lock_part(colored = enable_color_coding);
} else if (part == "fin") {
    ballast_fin_part(colored = enable_color_coding);
} else {
    assert(false, str("Unknown part: ", part));
}
